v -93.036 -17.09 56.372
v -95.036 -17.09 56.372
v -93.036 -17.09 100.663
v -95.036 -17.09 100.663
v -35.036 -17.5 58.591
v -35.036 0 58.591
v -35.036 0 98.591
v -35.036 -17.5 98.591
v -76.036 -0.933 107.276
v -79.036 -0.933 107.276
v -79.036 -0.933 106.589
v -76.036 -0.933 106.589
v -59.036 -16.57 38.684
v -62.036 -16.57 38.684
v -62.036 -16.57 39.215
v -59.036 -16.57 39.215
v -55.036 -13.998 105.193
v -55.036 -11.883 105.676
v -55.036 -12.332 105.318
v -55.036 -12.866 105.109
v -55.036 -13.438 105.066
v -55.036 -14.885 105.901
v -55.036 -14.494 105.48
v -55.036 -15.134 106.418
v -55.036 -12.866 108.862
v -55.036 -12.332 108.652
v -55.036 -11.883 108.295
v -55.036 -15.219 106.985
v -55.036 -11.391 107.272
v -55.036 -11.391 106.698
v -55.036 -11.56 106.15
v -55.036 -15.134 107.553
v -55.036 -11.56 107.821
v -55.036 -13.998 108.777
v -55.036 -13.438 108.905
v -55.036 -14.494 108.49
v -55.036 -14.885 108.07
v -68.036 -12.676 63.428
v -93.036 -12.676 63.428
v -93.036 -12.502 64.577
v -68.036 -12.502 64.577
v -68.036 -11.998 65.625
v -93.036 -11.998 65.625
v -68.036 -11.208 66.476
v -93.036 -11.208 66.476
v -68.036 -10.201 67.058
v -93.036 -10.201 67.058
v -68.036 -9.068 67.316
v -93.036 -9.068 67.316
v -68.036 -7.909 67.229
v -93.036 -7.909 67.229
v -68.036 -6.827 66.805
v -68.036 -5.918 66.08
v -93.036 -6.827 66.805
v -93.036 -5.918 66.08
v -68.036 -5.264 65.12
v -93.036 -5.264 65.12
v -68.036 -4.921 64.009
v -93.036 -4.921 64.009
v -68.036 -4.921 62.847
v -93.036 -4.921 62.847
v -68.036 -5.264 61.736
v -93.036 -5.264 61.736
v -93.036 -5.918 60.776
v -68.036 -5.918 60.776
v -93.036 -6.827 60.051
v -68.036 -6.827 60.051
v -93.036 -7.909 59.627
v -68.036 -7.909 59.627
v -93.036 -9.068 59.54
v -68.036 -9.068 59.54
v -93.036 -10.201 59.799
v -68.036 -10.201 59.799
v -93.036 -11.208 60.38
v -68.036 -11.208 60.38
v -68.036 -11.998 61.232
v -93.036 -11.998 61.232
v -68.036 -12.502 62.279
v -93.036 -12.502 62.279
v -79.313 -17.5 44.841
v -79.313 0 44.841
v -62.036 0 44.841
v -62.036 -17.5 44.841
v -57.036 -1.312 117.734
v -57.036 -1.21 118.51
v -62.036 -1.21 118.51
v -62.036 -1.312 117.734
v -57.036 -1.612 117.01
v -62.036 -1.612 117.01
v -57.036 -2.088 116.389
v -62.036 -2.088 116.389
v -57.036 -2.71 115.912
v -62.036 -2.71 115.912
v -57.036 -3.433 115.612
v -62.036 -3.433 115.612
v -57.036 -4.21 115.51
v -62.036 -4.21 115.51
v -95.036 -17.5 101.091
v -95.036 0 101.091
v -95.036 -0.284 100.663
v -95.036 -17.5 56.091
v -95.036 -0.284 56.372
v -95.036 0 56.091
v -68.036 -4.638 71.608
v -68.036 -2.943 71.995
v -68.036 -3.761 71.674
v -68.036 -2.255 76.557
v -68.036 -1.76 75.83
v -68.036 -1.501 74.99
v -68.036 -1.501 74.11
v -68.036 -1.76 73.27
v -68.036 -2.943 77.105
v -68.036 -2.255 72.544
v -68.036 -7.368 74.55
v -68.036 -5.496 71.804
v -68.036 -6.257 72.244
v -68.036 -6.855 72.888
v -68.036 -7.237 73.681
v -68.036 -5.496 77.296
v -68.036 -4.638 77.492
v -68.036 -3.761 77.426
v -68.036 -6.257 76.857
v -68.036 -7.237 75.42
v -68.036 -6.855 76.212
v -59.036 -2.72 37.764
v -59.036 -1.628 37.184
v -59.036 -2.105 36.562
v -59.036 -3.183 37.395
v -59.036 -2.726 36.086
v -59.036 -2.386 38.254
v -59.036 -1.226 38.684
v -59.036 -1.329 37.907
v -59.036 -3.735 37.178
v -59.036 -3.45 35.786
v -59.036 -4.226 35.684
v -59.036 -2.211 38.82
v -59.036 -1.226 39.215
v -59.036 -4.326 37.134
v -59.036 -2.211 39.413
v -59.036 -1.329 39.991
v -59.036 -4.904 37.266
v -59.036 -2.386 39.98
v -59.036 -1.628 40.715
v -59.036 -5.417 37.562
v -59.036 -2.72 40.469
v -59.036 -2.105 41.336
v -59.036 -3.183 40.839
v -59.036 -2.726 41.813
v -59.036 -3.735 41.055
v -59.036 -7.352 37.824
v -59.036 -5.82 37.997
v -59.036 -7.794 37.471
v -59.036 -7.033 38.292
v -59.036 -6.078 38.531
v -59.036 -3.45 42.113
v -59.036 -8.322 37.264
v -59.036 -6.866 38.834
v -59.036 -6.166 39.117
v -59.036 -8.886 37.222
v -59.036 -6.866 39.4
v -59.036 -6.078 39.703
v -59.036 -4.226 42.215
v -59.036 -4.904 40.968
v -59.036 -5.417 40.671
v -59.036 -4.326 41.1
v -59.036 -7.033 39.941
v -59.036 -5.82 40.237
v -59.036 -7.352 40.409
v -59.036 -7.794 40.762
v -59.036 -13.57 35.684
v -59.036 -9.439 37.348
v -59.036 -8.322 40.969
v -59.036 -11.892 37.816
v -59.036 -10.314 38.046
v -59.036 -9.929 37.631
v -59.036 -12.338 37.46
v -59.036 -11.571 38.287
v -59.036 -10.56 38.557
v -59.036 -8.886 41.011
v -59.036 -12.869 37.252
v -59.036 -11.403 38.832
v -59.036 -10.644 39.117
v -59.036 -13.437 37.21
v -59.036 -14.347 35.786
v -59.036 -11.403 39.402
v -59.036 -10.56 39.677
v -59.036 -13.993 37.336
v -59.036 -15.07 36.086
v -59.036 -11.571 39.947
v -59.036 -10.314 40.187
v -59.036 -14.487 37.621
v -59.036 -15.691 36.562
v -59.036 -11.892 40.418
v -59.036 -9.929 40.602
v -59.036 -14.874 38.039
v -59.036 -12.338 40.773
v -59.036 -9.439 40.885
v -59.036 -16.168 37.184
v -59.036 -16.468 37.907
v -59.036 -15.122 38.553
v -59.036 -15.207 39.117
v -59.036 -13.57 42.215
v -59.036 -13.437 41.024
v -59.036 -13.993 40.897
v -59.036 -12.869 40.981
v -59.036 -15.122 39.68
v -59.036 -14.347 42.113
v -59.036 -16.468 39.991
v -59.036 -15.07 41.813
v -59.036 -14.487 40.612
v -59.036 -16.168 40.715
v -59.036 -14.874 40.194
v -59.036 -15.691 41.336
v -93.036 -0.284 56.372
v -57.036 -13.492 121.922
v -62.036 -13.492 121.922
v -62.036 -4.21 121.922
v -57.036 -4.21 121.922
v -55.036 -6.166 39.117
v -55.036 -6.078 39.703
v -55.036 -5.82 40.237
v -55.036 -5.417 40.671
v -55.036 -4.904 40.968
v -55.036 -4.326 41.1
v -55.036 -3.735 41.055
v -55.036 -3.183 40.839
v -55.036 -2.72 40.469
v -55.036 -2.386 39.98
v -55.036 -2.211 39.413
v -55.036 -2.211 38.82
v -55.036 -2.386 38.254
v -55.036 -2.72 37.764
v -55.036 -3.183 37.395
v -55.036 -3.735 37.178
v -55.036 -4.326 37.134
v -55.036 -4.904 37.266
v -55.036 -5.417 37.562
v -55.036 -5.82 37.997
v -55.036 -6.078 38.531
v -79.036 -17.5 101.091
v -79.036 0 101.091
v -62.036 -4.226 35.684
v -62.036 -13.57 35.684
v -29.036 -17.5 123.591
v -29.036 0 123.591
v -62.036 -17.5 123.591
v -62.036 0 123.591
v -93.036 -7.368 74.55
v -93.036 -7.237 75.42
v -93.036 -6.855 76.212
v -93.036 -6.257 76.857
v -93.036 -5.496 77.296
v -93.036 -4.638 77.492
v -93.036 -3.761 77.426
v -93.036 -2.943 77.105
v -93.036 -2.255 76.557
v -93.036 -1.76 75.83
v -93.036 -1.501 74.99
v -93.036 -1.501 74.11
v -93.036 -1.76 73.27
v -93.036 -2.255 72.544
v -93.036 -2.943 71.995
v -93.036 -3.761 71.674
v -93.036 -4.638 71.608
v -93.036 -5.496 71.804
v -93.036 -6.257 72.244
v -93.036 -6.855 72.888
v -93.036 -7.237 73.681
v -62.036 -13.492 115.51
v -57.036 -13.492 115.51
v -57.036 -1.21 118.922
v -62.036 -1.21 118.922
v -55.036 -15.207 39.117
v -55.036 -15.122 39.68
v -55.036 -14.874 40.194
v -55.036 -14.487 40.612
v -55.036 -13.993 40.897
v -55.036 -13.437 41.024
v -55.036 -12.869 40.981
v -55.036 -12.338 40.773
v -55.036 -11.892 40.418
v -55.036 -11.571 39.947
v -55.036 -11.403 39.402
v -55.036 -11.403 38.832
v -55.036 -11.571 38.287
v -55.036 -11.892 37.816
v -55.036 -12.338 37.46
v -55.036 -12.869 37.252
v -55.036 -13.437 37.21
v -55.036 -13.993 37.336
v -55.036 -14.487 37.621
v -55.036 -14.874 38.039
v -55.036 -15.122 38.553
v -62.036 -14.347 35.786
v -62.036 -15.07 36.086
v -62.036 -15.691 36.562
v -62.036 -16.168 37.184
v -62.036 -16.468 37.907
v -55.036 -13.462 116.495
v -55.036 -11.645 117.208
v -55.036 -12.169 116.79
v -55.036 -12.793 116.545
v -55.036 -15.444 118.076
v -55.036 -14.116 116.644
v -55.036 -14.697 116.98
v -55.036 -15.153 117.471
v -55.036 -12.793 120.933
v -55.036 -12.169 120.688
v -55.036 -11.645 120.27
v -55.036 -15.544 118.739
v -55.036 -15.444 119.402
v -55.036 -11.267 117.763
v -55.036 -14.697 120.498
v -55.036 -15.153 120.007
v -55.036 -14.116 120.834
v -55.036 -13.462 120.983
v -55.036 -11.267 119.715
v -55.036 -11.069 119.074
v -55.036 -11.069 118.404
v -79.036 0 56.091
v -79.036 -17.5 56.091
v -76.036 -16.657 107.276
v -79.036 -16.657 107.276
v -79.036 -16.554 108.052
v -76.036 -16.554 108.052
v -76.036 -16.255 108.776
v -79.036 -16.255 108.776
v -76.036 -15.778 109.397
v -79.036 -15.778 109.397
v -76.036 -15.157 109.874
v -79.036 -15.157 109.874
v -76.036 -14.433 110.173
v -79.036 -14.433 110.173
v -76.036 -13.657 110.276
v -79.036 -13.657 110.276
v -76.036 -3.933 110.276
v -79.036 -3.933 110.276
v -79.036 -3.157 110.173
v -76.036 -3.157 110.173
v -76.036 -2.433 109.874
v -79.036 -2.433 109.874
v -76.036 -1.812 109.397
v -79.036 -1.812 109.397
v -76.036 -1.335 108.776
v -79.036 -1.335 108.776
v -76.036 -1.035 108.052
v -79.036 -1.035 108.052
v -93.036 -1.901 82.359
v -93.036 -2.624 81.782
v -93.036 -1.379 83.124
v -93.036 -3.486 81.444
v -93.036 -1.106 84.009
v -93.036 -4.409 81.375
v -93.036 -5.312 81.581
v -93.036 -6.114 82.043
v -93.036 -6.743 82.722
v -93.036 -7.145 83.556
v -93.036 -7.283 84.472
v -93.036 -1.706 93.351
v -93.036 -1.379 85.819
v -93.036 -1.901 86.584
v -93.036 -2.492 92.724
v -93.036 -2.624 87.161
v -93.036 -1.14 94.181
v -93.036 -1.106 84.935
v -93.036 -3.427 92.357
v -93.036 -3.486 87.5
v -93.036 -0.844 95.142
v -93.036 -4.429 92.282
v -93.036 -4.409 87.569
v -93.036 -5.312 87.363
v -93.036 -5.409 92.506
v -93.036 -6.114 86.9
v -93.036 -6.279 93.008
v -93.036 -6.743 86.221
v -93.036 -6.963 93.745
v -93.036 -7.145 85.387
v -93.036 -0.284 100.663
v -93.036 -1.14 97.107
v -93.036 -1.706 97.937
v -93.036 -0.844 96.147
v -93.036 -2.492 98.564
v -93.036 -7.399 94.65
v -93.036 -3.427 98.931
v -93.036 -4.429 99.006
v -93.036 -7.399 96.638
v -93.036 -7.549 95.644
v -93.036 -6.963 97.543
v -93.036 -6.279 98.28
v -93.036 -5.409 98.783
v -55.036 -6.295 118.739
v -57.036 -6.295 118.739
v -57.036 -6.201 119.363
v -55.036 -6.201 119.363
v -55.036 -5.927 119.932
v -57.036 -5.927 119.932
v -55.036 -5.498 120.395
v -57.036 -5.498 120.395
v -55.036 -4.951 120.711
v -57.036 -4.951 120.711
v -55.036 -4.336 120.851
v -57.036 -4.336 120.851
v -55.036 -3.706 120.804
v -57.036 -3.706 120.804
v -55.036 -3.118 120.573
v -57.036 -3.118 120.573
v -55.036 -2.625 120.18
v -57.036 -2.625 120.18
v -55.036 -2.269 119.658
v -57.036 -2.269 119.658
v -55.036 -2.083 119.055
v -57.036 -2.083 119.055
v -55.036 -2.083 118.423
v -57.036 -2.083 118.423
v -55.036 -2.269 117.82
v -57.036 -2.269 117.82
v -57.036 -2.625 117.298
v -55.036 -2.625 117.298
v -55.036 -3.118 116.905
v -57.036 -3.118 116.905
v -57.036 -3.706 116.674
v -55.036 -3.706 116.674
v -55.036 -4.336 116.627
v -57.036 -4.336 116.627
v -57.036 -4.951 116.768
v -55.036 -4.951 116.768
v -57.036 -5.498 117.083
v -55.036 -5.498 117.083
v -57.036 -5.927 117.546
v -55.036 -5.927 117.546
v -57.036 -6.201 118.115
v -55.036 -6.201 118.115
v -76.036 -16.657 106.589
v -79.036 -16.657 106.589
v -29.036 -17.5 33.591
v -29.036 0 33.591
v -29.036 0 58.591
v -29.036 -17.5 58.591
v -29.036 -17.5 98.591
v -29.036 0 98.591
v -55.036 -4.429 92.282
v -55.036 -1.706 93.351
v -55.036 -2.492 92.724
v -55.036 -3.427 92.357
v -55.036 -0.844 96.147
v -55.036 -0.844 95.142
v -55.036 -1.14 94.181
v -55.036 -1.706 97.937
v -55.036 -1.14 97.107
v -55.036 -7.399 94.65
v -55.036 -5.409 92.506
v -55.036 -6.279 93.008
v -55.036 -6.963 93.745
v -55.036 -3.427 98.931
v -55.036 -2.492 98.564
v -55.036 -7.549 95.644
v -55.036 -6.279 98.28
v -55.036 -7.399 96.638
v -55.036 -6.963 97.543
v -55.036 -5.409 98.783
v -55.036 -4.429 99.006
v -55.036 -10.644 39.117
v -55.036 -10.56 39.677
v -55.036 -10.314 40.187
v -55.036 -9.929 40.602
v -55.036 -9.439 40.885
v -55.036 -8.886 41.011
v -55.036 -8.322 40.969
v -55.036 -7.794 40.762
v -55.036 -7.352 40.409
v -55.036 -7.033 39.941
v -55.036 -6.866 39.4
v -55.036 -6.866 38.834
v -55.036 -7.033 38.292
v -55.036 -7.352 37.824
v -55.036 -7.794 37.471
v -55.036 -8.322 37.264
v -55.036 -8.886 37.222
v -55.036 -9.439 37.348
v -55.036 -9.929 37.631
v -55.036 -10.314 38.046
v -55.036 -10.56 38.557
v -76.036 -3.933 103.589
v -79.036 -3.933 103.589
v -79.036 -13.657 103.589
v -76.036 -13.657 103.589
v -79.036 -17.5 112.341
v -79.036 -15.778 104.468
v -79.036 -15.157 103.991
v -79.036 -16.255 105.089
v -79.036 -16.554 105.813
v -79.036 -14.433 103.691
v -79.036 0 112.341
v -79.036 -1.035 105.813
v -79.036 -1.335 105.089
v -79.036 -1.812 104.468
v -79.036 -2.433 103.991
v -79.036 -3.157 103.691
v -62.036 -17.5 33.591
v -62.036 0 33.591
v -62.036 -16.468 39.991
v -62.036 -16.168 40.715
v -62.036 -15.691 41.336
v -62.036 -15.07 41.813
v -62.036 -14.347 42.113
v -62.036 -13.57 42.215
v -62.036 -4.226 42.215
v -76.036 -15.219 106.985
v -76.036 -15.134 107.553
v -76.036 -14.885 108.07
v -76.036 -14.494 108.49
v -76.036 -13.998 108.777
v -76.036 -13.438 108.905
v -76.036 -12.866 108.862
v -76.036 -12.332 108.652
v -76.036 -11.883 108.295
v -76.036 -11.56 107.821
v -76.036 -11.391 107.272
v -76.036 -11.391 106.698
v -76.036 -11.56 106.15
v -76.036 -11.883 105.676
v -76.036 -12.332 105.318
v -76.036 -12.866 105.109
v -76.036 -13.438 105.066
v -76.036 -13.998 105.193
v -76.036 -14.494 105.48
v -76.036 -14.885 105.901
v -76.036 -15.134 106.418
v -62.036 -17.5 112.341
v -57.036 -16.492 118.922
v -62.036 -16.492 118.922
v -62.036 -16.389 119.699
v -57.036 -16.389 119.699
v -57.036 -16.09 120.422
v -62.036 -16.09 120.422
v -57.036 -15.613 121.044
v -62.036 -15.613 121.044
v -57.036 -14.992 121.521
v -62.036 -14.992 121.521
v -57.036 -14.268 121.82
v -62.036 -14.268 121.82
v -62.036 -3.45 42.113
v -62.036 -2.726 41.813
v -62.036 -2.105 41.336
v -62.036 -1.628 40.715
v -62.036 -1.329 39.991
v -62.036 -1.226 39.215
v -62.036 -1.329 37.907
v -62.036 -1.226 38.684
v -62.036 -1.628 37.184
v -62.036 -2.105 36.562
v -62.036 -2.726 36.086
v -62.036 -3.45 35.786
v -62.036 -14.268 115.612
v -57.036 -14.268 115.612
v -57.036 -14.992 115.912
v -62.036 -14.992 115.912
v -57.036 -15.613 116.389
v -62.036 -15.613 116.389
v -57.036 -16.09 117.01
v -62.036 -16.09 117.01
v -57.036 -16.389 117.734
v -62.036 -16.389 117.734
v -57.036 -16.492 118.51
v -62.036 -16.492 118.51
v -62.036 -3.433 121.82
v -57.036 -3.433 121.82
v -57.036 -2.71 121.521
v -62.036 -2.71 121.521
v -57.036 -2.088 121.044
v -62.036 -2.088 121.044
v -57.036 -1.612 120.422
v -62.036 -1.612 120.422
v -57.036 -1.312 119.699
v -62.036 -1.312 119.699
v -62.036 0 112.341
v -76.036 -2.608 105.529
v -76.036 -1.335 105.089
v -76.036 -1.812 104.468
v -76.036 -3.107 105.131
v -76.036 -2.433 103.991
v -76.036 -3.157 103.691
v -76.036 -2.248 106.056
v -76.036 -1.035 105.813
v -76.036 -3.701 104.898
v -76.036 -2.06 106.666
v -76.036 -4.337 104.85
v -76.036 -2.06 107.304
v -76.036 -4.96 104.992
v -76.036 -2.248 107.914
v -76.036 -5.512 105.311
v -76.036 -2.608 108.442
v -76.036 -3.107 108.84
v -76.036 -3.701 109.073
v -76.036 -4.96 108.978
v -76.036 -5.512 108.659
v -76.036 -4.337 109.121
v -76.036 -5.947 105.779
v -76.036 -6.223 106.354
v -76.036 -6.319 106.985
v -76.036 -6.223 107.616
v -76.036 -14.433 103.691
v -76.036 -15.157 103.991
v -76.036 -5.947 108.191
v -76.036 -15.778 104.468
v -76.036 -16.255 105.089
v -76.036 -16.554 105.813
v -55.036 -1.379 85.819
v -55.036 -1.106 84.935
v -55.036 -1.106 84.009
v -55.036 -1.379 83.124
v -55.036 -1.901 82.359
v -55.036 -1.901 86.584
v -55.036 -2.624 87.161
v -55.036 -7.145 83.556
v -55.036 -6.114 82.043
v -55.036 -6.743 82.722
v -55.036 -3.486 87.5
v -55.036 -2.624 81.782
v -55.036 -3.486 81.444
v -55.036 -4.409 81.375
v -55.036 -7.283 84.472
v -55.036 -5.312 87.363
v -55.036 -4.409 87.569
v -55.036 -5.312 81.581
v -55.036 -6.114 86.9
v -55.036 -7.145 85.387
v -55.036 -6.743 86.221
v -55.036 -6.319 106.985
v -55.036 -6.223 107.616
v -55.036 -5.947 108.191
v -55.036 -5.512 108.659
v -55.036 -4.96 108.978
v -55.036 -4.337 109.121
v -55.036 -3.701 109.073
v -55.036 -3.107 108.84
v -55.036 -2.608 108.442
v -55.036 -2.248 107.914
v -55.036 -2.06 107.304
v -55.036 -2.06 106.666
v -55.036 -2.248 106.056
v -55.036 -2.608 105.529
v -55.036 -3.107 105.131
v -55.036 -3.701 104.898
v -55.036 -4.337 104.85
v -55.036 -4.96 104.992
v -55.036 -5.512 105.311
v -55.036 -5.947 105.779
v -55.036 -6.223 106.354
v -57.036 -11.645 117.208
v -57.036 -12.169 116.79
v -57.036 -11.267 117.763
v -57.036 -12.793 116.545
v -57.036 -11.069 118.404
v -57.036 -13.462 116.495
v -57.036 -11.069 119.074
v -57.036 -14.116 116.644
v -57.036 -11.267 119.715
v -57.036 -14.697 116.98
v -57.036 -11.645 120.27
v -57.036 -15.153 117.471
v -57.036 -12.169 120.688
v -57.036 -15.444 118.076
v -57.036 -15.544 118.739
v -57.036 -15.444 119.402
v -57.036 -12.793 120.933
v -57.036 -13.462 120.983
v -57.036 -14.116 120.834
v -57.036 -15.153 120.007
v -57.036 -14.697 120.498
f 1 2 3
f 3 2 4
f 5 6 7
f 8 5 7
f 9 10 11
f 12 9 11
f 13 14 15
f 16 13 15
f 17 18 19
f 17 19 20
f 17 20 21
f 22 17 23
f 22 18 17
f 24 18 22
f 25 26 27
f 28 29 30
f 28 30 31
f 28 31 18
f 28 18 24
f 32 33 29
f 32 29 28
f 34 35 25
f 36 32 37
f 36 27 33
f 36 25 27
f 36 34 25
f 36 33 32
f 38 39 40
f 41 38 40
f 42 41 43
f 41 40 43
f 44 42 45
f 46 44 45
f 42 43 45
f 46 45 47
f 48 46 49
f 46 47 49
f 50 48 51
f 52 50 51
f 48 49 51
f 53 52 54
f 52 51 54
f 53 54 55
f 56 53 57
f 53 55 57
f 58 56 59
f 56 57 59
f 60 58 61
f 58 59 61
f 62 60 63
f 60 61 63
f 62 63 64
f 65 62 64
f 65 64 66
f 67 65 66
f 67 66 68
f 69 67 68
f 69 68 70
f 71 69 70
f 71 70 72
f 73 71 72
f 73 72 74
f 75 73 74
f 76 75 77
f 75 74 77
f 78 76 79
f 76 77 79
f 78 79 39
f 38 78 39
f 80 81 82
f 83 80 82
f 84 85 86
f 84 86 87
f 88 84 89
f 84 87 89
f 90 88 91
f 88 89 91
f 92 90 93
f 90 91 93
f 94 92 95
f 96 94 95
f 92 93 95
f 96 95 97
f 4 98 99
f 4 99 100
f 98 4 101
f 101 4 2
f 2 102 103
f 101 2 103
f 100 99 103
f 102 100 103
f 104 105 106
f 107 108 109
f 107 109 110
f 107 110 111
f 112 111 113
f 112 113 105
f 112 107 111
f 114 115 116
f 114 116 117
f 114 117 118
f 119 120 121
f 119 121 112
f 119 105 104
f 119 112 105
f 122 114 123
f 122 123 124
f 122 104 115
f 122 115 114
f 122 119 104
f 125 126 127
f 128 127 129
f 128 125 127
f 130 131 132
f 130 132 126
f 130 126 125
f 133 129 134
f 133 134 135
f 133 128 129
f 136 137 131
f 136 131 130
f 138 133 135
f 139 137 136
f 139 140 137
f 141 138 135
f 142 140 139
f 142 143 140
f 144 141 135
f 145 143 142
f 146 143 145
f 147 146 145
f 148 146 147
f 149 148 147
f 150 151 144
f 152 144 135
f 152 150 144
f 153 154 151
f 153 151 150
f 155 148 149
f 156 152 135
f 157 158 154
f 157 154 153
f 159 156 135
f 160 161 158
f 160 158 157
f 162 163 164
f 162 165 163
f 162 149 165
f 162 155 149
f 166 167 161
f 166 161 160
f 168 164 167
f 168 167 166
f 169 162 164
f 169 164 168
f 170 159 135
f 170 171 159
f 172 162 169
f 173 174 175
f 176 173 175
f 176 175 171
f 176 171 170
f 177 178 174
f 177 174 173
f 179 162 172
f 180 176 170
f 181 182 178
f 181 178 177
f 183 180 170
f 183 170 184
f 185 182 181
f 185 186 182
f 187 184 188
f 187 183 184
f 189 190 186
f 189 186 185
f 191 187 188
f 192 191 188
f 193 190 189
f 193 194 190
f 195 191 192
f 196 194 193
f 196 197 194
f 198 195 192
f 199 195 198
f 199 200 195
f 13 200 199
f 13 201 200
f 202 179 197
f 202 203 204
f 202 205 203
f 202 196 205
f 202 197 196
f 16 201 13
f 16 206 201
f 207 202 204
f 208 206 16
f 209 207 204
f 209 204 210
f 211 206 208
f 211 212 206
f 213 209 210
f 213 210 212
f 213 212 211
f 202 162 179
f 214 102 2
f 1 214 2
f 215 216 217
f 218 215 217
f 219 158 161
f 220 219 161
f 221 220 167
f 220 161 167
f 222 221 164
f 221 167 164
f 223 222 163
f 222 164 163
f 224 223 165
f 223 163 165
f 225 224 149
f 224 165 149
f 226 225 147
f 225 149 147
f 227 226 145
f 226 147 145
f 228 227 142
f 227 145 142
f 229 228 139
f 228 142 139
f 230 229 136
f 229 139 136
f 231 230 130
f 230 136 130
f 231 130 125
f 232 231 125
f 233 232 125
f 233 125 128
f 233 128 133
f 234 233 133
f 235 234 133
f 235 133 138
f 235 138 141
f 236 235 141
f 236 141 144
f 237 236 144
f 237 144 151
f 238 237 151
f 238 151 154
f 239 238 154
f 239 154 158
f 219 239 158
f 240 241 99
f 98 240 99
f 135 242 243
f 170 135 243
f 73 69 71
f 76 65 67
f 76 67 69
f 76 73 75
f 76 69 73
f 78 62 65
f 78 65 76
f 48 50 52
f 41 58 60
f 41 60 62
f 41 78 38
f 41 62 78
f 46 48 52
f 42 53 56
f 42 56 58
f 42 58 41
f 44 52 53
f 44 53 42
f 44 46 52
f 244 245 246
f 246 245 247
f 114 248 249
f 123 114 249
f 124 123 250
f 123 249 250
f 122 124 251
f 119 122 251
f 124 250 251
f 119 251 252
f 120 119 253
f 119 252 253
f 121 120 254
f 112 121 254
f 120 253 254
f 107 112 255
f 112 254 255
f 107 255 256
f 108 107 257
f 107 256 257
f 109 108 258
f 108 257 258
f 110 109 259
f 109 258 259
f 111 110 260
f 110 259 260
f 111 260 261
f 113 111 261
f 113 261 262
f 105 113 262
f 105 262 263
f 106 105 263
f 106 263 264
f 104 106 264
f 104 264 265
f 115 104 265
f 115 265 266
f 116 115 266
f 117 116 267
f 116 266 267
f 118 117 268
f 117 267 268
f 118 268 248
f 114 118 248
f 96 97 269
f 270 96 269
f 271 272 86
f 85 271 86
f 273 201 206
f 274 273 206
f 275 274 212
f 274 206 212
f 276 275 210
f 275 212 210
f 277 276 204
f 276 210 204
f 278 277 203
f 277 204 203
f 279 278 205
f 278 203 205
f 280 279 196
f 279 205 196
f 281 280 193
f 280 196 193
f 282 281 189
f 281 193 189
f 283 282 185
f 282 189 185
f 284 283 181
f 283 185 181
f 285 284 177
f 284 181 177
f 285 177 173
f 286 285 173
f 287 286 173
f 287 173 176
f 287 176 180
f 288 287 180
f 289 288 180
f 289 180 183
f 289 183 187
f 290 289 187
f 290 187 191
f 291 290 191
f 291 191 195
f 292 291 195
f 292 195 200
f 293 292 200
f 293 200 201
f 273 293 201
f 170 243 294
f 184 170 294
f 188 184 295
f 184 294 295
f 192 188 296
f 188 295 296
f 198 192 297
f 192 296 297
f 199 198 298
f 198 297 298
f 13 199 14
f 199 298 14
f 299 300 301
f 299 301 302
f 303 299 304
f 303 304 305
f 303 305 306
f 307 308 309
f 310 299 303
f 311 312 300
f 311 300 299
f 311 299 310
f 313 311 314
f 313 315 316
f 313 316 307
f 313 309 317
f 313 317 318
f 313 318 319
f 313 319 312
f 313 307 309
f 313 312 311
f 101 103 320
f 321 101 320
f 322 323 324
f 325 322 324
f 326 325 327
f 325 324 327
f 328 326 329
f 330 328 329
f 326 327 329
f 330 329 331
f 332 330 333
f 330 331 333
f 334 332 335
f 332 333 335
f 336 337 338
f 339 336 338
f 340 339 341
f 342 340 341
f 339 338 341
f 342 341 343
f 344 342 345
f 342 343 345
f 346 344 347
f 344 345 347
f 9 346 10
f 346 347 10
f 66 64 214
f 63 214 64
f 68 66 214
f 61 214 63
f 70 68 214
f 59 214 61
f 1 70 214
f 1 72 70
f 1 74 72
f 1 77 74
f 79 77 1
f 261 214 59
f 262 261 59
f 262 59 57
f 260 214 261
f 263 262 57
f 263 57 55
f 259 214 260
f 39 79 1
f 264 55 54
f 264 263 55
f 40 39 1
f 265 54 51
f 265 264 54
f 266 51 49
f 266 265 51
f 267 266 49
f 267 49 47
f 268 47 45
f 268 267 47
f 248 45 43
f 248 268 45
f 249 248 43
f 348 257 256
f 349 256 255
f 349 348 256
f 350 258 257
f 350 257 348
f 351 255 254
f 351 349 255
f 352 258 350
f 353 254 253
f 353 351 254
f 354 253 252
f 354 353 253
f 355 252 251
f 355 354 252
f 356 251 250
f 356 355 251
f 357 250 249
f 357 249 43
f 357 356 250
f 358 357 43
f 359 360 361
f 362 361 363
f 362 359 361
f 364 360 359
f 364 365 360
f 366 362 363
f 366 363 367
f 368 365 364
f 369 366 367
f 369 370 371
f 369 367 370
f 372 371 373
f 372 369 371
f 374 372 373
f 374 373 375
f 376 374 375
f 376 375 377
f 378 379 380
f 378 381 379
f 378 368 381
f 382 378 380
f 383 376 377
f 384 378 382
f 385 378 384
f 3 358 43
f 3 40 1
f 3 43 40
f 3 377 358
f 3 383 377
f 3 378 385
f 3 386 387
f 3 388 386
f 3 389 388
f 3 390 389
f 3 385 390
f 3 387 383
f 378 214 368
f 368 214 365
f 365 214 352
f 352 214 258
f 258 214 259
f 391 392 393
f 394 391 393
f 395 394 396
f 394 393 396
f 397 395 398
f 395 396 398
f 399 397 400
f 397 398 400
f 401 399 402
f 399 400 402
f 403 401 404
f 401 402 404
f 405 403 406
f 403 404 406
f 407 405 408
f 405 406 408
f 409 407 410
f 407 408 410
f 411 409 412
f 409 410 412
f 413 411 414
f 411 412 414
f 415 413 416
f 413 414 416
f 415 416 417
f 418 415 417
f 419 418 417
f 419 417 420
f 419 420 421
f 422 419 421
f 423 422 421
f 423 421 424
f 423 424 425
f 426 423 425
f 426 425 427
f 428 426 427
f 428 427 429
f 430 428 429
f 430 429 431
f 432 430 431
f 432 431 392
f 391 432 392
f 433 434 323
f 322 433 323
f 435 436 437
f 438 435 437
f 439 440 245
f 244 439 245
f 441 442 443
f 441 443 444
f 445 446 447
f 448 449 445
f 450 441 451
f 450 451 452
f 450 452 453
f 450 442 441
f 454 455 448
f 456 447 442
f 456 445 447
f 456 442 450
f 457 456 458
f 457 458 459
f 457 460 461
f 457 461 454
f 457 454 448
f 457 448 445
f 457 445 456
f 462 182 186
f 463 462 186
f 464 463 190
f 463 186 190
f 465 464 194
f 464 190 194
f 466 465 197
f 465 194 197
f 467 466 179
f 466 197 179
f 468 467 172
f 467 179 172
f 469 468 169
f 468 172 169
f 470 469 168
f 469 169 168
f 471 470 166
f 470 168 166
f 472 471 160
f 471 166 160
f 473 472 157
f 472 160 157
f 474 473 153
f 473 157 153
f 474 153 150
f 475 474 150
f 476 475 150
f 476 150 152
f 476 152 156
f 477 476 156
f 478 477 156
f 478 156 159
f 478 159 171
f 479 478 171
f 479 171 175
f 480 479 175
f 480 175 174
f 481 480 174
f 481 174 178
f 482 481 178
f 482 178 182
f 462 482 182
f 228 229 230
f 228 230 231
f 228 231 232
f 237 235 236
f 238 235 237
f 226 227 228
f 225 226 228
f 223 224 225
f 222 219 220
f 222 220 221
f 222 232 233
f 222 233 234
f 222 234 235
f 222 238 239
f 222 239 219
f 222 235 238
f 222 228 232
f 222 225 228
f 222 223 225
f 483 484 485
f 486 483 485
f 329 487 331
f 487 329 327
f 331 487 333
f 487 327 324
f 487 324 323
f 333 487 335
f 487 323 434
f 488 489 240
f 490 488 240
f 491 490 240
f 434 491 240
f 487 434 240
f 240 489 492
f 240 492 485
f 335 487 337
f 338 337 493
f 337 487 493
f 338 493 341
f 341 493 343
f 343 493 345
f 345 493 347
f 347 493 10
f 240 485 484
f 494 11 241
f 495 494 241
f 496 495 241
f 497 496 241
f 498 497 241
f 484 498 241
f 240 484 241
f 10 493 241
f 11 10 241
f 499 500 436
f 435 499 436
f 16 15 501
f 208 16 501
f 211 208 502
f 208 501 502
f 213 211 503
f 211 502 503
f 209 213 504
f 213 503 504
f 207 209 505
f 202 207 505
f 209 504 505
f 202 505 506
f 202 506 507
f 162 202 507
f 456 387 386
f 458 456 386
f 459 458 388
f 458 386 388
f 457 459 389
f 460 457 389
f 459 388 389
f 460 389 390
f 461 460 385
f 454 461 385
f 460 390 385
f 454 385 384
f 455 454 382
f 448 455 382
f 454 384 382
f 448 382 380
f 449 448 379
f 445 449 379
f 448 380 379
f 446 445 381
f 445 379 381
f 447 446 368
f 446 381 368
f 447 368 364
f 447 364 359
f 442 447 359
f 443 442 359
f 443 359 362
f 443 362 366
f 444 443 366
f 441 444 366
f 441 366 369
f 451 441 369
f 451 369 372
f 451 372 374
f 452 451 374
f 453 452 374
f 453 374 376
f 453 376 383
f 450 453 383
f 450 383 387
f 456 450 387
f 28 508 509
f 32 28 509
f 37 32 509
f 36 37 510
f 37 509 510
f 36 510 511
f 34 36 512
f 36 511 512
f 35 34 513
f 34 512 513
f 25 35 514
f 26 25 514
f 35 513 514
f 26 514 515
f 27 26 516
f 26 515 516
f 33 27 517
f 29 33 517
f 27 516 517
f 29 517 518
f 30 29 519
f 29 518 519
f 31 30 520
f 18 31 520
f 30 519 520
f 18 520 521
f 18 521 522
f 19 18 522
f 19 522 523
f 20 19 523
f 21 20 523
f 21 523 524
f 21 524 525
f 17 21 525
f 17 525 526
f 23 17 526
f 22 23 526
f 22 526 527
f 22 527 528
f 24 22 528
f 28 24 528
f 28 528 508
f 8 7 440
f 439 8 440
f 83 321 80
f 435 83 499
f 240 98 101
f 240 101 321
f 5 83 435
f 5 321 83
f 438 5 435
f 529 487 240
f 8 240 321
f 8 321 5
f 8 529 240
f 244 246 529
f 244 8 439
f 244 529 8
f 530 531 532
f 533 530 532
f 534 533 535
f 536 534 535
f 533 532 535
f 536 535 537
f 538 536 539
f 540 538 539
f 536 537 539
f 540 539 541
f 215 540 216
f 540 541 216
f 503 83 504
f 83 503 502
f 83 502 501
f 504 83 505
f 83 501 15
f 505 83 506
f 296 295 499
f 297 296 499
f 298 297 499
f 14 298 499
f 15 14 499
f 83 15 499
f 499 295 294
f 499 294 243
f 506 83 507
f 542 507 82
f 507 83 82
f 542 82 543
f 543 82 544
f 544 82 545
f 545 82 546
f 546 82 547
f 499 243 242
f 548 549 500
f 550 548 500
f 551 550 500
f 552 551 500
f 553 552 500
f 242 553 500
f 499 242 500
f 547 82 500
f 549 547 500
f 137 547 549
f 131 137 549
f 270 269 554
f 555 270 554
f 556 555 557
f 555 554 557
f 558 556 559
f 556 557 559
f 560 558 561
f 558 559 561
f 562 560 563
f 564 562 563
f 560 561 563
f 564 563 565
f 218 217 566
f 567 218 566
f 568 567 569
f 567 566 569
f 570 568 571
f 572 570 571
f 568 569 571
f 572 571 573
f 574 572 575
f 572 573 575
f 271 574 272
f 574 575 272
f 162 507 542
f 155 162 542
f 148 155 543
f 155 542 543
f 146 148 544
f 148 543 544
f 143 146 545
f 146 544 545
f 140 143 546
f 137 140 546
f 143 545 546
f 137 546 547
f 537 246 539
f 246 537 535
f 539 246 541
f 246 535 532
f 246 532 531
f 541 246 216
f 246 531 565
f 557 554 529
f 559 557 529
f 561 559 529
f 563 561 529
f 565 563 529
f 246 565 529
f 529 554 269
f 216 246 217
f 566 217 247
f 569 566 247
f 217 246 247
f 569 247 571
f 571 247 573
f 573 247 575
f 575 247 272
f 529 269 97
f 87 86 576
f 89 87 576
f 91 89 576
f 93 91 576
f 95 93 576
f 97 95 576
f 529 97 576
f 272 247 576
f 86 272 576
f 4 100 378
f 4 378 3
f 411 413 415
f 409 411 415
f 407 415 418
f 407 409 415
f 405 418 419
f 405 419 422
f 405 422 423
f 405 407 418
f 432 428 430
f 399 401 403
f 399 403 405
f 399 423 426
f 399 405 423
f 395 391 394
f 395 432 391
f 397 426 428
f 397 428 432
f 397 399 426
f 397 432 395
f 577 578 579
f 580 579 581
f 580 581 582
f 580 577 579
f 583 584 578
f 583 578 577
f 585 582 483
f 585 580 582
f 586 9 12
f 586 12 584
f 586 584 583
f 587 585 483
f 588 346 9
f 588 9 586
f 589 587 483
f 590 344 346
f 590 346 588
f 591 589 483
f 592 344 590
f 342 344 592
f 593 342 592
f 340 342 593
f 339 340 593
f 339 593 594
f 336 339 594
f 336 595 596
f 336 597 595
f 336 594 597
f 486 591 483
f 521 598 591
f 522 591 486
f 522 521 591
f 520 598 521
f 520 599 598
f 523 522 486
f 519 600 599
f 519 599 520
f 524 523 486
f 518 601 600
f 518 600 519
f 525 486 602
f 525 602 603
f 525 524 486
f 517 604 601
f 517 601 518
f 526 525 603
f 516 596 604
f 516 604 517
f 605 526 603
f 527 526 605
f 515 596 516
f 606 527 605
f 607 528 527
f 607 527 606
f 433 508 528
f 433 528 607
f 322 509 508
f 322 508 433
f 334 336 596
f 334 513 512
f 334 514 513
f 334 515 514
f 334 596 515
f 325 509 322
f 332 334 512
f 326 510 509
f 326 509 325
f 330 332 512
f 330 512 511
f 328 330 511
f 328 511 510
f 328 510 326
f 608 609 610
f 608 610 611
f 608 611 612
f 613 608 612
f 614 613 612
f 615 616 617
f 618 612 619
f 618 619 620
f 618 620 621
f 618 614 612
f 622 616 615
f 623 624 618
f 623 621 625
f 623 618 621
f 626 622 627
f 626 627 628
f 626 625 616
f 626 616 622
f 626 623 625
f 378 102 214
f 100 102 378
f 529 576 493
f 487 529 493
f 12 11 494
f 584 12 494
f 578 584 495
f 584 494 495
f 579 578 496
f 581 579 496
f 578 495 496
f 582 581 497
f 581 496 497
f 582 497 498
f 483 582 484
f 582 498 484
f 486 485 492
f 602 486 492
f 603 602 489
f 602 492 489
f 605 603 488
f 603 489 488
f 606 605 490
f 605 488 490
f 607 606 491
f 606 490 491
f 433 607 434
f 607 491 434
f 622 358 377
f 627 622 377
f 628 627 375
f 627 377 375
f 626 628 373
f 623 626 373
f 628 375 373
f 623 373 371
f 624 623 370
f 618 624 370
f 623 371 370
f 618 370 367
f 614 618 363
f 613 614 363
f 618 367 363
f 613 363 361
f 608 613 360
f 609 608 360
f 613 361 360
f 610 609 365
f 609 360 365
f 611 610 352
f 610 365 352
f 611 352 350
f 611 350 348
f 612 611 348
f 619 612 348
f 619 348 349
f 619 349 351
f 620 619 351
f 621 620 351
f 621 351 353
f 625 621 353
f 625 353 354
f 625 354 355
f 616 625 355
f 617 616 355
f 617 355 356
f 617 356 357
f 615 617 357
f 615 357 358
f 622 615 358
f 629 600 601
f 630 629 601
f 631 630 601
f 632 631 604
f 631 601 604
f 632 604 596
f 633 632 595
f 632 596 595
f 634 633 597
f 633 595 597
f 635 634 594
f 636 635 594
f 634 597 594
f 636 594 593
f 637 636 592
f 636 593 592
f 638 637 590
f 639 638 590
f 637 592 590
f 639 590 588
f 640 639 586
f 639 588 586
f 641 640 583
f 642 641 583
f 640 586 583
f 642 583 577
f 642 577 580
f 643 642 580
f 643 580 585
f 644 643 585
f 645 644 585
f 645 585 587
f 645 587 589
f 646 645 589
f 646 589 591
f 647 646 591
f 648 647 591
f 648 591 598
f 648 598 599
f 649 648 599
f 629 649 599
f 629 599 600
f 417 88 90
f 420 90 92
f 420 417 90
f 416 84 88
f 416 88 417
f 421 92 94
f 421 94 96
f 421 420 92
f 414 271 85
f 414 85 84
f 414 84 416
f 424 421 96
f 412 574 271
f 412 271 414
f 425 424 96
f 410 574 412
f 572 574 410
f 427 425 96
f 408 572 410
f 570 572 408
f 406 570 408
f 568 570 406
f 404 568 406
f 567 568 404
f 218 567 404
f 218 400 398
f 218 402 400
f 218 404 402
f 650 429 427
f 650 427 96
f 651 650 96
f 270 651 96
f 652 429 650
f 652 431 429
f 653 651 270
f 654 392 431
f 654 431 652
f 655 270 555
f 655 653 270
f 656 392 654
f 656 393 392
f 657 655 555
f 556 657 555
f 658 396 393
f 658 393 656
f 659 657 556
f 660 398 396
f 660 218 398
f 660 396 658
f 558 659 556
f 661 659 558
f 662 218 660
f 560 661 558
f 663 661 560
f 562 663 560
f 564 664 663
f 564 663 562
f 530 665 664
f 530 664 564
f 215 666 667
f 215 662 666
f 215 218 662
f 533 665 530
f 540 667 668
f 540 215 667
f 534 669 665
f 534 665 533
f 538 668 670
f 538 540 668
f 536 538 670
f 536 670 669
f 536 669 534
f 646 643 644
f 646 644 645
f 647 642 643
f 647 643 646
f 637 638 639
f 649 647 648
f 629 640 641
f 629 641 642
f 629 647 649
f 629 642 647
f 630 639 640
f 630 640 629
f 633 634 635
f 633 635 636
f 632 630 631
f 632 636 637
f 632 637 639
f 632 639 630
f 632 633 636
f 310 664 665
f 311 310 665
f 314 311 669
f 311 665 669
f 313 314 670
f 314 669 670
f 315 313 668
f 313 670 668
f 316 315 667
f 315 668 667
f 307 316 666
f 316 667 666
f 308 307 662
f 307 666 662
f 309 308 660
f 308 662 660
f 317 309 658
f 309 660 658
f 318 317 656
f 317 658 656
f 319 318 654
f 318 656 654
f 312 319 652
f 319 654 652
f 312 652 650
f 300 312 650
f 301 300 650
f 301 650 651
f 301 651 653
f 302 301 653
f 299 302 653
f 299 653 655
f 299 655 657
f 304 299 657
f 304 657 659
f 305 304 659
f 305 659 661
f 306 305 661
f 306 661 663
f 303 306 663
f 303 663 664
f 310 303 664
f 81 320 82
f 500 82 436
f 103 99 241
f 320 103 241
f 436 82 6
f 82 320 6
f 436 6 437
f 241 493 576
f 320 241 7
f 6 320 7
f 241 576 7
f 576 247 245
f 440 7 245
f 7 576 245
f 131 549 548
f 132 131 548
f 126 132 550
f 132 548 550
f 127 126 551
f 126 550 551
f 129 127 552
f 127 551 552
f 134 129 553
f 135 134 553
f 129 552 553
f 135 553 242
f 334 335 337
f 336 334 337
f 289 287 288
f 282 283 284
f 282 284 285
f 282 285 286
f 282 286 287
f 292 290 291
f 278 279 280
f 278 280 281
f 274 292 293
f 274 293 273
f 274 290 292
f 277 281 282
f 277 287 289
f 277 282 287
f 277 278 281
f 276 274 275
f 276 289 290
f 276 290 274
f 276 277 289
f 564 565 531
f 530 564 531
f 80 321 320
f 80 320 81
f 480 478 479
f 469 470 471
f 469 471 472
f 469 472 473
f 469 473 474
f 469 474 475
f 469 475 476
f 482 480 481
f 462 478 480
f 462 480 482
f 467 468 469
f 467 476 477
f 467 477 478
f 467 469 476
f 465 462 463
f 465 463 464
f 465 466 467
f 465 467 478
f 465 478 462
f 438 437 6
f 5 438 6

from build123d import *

# Parameters (mm, degrees)
F1_DEPTH  = 17.5
F2_R      = 2.25021
F2_R_2    = 2.117892
F2_R_3    = 2.141219
F2_R_4    = 1.925027
F2_R_5    = 3.371511
F2_R_6    = 3.105781
F2_R_7    = 1.98861
F2_R_8    = 1.899979
F2_R_9    = 1.912547
F3_DEPTH  = 40
F4_R      = 2.117892
F4_R_2    = 2.25021
F5_DEPTH  = 5
F6_R      = 2.141219
F6_R_2    = 1.925027
F7_DEPTH  = 3
F9_DEPTH  = 3
F10_W     = 16.805832
F10_H     = 44.291496
F10_R     = 3.105781
F10_R_2   = 3.371511
F11_DEPTH = 2
F12_R     = 2.950074
F12_R_2   = 3.899051
F13_DEPTH = 25


with BuildPart() as f1:
    # F0 (on Front) → F1 (new body)
    with BuildSketch(Plane.XZ):
        Polygon((-29.036315, 123.591392), (-62.036315, 123.591392), (-62.036315, 112.341392), (-79.036315, 112.341392), (-79.036315, 101.091392), (-95.036315, 101.091392), (-95.036315, 56.091392), (-79.036315, 56.091392), (-79.313149, 44.841392), (-62.036315, 44.841392), (-62.036315, 33.591392), (-29.036315, 33.591392), (-29.036315, 58.591392), (-35.036315, 58.591392), (-35.036315, 98.591392), (-29.036315, 98.591392), align=None)
    extrude(amount=F1_DEPTH)

    # F2 (on face) → F3 (cut)
    with BuildSketch(Plane(origin=(-95.036315, 0, 0), x_dir=(0, -1, 0), z_dir=(-1, 0, 0))):
        with Locations((13.294209, 118.739031)):
            Circle(F2_R)
        with Locations((4.177382, 118.739031)):
            Circle(F2_R_2)
        with Locations((4.177382, 106.985271)):
            Circle(F2_R_3)
        with Locations((13.294209, 106.985271)):
            Circle(F2_R_4)
        with Locations((4.177382, 95.644102)):
            Circle(F2_R_5)
        with Locations((4.177382, 84.471688)):
            Circle(F2_R_6)
        with Locations((4.177382, 39.11674)):
            Circle(F2_R_7)
        with Locations((8.744364, 39.11674)):
            Circle(F2_R_8)
        with Locations((13.294209, 39.11674)):
            Circle(F2_R_9)
    extrude(amount=-F3_DEPTH, mode=Mode.SUBTRACT)

    # F4 (on face) → F5 (cut)
    with BuildSketch(Plane(origin=(-62.036315, 0, 0), x_dir=(0, -1, 0), z_dir=(-1, 0, 0))):
        with BuildLine():
            Line((13.491717, 121.922452), (4.209779, 121.922452))
            ThreePointArc((4.209779, 121.922452), (2.088459, 121.043773), (1.209779, 118.922452))
            Line((1.209779, 118.922452), (1.209779, 118.510082))
            ThreePointArc((1.209779, 118.510082), (2.088459, 116.388762), (4.209779, 115.510082))
            Line((4.209779, 115.510082), (13.491717, 115.510082))
            ThreePointArc((13.491717, 115.510082), (15.613037, 116.388762), (16.491717, 118.510082))
            Line((16.491717, 118.510082), (16.491717, 118.922452))
            ThreePointArc((16.491717, 118.922452), (15.613037, 121.043773), (13.491717, 121.922452))
        make_face()
        with Locations((4.177382, 118.739031)):
            Circle(F4_R, mode=Mode.SUBTRACT)
        with Locations((13.294209, 118.739031)):
            Circle(F4_R_2, mode=Mode.SUBTRACT)
    extrude(amount=-F5_DEPTH, mode=Mode.SUBTRACT)

    # F6 (on face) → F7 (cut)
    with BuildSketch(Plane(origin=(-79.036315, 0, 0), x_dir=(0, -1, 0), z_dir=(-1, 0, 0))):
        with BuildLine():
            Line((13.656557, 110.275699), (3.933159, 110.275699))
            ThreePointArc((3.933159, 110.275699), (1.811838, 109.397019), (0.933159, 107.275699))
            Line((0.933159, 107.275699), (0.933159, 106.589088))
            ThreePointArc((0.933159, 106.589088), (1.811838, 104.467767), (3.933159, 103.589088))
            Line((3.933159, 103.589088), (13.656557, 103.589088))
            ThreePointArc((13.656557, 103.589088), (15.777877, 104.467767), (16.656557, 106.589088))
            Line((16.656557, 106.589088), (16.656557, 107.275699))
            ThreePointArc((16.656557, 107.275699), (15.777877, 109.397019), (13.656557, 110.275699))
        make_face()
        with Locations((4.177382, 106.985271)):
            Circle(F6_R, mode=Mode.SUBTRACT)
        with Locations((13.294209, 106.985271)):
            Circle(F6_R_2, mode=Mode.SUBTRACT)
    extrude(amount=-F7_DEPTH, mode=Mode.SUBTRACT)

    # F8 (on face) → F9 (cut)
    with BuildSketch(Plane(origin=(-62.036315, 0, 0), x_dir=(0, -1, 0), z_dir=(-1, 0, 0))):
        with BuildLine():
            ThreePointArc((1.226484, 38.683788), (2.105164, 36.562468), (4.226484, 35.683788))
            Line((4.226484, 35.683788), (13.570151, 35.683788))
            ThreePointArc((13.570151, 35.683788), (15.691471, 36.562468), (16.570151, 38.683788))
            Line((16.570151, 38.683788), (16.570151, 39.214782))
            ThreePointArc((16.570151, 39.214782), (15.691471, 41.336103), (13.570151, 42.214782))
            Line((13.570151, 42.214782), (4.226484, 42.214782))
            ThreePointArc((4.226484, 42.214782), (2.105164, 41.336103), (1.226484, 39.214782))
            Line((1.226484, 39.214782), (1.226484, 38.683788))
        make_face()
    extrude(amount=-F9_DEPTH, mode=Mode.SUBTRACT)

    # F10 (on face) → F11 (cut)
    with BuildSketch(Plane(origin=(-95.036315, 0, 0), x_dir=(0, -1, 0), z_dir=(-1, 0, 0))):
        with Locations((8.686814, 78.51769)):
            Rectangle(F10_W, F10_H)
        with Locations((4.177382, 84.471688)):
            Circle(F10_R, mode=Mode.SUBTRACT)
        with Locations((4.177382, 95.644102)):
            Circle(F10_R_2, mode=Mode.SUBTRACT)
    extrude(amount=-F11_DEPTH, mode=Mode.SUBTRACT)

    # F12 (on face) → F13 (cut)
    with BuildSketch(Plane(origin=(-93.036315, 0, 0), x_dir=(0, -1, 0), z_dir=(-1, 0, 0))):
        with Locations((4.417871, 74.5501)):
            Circle(F12_R)
        with Locations((8.776497, 63.428089)):
            Circle(F12_R_2)
    extrude(amount=-F13_DEPTH, mode=Mode.SUBTRACT)


solid = f1.part
